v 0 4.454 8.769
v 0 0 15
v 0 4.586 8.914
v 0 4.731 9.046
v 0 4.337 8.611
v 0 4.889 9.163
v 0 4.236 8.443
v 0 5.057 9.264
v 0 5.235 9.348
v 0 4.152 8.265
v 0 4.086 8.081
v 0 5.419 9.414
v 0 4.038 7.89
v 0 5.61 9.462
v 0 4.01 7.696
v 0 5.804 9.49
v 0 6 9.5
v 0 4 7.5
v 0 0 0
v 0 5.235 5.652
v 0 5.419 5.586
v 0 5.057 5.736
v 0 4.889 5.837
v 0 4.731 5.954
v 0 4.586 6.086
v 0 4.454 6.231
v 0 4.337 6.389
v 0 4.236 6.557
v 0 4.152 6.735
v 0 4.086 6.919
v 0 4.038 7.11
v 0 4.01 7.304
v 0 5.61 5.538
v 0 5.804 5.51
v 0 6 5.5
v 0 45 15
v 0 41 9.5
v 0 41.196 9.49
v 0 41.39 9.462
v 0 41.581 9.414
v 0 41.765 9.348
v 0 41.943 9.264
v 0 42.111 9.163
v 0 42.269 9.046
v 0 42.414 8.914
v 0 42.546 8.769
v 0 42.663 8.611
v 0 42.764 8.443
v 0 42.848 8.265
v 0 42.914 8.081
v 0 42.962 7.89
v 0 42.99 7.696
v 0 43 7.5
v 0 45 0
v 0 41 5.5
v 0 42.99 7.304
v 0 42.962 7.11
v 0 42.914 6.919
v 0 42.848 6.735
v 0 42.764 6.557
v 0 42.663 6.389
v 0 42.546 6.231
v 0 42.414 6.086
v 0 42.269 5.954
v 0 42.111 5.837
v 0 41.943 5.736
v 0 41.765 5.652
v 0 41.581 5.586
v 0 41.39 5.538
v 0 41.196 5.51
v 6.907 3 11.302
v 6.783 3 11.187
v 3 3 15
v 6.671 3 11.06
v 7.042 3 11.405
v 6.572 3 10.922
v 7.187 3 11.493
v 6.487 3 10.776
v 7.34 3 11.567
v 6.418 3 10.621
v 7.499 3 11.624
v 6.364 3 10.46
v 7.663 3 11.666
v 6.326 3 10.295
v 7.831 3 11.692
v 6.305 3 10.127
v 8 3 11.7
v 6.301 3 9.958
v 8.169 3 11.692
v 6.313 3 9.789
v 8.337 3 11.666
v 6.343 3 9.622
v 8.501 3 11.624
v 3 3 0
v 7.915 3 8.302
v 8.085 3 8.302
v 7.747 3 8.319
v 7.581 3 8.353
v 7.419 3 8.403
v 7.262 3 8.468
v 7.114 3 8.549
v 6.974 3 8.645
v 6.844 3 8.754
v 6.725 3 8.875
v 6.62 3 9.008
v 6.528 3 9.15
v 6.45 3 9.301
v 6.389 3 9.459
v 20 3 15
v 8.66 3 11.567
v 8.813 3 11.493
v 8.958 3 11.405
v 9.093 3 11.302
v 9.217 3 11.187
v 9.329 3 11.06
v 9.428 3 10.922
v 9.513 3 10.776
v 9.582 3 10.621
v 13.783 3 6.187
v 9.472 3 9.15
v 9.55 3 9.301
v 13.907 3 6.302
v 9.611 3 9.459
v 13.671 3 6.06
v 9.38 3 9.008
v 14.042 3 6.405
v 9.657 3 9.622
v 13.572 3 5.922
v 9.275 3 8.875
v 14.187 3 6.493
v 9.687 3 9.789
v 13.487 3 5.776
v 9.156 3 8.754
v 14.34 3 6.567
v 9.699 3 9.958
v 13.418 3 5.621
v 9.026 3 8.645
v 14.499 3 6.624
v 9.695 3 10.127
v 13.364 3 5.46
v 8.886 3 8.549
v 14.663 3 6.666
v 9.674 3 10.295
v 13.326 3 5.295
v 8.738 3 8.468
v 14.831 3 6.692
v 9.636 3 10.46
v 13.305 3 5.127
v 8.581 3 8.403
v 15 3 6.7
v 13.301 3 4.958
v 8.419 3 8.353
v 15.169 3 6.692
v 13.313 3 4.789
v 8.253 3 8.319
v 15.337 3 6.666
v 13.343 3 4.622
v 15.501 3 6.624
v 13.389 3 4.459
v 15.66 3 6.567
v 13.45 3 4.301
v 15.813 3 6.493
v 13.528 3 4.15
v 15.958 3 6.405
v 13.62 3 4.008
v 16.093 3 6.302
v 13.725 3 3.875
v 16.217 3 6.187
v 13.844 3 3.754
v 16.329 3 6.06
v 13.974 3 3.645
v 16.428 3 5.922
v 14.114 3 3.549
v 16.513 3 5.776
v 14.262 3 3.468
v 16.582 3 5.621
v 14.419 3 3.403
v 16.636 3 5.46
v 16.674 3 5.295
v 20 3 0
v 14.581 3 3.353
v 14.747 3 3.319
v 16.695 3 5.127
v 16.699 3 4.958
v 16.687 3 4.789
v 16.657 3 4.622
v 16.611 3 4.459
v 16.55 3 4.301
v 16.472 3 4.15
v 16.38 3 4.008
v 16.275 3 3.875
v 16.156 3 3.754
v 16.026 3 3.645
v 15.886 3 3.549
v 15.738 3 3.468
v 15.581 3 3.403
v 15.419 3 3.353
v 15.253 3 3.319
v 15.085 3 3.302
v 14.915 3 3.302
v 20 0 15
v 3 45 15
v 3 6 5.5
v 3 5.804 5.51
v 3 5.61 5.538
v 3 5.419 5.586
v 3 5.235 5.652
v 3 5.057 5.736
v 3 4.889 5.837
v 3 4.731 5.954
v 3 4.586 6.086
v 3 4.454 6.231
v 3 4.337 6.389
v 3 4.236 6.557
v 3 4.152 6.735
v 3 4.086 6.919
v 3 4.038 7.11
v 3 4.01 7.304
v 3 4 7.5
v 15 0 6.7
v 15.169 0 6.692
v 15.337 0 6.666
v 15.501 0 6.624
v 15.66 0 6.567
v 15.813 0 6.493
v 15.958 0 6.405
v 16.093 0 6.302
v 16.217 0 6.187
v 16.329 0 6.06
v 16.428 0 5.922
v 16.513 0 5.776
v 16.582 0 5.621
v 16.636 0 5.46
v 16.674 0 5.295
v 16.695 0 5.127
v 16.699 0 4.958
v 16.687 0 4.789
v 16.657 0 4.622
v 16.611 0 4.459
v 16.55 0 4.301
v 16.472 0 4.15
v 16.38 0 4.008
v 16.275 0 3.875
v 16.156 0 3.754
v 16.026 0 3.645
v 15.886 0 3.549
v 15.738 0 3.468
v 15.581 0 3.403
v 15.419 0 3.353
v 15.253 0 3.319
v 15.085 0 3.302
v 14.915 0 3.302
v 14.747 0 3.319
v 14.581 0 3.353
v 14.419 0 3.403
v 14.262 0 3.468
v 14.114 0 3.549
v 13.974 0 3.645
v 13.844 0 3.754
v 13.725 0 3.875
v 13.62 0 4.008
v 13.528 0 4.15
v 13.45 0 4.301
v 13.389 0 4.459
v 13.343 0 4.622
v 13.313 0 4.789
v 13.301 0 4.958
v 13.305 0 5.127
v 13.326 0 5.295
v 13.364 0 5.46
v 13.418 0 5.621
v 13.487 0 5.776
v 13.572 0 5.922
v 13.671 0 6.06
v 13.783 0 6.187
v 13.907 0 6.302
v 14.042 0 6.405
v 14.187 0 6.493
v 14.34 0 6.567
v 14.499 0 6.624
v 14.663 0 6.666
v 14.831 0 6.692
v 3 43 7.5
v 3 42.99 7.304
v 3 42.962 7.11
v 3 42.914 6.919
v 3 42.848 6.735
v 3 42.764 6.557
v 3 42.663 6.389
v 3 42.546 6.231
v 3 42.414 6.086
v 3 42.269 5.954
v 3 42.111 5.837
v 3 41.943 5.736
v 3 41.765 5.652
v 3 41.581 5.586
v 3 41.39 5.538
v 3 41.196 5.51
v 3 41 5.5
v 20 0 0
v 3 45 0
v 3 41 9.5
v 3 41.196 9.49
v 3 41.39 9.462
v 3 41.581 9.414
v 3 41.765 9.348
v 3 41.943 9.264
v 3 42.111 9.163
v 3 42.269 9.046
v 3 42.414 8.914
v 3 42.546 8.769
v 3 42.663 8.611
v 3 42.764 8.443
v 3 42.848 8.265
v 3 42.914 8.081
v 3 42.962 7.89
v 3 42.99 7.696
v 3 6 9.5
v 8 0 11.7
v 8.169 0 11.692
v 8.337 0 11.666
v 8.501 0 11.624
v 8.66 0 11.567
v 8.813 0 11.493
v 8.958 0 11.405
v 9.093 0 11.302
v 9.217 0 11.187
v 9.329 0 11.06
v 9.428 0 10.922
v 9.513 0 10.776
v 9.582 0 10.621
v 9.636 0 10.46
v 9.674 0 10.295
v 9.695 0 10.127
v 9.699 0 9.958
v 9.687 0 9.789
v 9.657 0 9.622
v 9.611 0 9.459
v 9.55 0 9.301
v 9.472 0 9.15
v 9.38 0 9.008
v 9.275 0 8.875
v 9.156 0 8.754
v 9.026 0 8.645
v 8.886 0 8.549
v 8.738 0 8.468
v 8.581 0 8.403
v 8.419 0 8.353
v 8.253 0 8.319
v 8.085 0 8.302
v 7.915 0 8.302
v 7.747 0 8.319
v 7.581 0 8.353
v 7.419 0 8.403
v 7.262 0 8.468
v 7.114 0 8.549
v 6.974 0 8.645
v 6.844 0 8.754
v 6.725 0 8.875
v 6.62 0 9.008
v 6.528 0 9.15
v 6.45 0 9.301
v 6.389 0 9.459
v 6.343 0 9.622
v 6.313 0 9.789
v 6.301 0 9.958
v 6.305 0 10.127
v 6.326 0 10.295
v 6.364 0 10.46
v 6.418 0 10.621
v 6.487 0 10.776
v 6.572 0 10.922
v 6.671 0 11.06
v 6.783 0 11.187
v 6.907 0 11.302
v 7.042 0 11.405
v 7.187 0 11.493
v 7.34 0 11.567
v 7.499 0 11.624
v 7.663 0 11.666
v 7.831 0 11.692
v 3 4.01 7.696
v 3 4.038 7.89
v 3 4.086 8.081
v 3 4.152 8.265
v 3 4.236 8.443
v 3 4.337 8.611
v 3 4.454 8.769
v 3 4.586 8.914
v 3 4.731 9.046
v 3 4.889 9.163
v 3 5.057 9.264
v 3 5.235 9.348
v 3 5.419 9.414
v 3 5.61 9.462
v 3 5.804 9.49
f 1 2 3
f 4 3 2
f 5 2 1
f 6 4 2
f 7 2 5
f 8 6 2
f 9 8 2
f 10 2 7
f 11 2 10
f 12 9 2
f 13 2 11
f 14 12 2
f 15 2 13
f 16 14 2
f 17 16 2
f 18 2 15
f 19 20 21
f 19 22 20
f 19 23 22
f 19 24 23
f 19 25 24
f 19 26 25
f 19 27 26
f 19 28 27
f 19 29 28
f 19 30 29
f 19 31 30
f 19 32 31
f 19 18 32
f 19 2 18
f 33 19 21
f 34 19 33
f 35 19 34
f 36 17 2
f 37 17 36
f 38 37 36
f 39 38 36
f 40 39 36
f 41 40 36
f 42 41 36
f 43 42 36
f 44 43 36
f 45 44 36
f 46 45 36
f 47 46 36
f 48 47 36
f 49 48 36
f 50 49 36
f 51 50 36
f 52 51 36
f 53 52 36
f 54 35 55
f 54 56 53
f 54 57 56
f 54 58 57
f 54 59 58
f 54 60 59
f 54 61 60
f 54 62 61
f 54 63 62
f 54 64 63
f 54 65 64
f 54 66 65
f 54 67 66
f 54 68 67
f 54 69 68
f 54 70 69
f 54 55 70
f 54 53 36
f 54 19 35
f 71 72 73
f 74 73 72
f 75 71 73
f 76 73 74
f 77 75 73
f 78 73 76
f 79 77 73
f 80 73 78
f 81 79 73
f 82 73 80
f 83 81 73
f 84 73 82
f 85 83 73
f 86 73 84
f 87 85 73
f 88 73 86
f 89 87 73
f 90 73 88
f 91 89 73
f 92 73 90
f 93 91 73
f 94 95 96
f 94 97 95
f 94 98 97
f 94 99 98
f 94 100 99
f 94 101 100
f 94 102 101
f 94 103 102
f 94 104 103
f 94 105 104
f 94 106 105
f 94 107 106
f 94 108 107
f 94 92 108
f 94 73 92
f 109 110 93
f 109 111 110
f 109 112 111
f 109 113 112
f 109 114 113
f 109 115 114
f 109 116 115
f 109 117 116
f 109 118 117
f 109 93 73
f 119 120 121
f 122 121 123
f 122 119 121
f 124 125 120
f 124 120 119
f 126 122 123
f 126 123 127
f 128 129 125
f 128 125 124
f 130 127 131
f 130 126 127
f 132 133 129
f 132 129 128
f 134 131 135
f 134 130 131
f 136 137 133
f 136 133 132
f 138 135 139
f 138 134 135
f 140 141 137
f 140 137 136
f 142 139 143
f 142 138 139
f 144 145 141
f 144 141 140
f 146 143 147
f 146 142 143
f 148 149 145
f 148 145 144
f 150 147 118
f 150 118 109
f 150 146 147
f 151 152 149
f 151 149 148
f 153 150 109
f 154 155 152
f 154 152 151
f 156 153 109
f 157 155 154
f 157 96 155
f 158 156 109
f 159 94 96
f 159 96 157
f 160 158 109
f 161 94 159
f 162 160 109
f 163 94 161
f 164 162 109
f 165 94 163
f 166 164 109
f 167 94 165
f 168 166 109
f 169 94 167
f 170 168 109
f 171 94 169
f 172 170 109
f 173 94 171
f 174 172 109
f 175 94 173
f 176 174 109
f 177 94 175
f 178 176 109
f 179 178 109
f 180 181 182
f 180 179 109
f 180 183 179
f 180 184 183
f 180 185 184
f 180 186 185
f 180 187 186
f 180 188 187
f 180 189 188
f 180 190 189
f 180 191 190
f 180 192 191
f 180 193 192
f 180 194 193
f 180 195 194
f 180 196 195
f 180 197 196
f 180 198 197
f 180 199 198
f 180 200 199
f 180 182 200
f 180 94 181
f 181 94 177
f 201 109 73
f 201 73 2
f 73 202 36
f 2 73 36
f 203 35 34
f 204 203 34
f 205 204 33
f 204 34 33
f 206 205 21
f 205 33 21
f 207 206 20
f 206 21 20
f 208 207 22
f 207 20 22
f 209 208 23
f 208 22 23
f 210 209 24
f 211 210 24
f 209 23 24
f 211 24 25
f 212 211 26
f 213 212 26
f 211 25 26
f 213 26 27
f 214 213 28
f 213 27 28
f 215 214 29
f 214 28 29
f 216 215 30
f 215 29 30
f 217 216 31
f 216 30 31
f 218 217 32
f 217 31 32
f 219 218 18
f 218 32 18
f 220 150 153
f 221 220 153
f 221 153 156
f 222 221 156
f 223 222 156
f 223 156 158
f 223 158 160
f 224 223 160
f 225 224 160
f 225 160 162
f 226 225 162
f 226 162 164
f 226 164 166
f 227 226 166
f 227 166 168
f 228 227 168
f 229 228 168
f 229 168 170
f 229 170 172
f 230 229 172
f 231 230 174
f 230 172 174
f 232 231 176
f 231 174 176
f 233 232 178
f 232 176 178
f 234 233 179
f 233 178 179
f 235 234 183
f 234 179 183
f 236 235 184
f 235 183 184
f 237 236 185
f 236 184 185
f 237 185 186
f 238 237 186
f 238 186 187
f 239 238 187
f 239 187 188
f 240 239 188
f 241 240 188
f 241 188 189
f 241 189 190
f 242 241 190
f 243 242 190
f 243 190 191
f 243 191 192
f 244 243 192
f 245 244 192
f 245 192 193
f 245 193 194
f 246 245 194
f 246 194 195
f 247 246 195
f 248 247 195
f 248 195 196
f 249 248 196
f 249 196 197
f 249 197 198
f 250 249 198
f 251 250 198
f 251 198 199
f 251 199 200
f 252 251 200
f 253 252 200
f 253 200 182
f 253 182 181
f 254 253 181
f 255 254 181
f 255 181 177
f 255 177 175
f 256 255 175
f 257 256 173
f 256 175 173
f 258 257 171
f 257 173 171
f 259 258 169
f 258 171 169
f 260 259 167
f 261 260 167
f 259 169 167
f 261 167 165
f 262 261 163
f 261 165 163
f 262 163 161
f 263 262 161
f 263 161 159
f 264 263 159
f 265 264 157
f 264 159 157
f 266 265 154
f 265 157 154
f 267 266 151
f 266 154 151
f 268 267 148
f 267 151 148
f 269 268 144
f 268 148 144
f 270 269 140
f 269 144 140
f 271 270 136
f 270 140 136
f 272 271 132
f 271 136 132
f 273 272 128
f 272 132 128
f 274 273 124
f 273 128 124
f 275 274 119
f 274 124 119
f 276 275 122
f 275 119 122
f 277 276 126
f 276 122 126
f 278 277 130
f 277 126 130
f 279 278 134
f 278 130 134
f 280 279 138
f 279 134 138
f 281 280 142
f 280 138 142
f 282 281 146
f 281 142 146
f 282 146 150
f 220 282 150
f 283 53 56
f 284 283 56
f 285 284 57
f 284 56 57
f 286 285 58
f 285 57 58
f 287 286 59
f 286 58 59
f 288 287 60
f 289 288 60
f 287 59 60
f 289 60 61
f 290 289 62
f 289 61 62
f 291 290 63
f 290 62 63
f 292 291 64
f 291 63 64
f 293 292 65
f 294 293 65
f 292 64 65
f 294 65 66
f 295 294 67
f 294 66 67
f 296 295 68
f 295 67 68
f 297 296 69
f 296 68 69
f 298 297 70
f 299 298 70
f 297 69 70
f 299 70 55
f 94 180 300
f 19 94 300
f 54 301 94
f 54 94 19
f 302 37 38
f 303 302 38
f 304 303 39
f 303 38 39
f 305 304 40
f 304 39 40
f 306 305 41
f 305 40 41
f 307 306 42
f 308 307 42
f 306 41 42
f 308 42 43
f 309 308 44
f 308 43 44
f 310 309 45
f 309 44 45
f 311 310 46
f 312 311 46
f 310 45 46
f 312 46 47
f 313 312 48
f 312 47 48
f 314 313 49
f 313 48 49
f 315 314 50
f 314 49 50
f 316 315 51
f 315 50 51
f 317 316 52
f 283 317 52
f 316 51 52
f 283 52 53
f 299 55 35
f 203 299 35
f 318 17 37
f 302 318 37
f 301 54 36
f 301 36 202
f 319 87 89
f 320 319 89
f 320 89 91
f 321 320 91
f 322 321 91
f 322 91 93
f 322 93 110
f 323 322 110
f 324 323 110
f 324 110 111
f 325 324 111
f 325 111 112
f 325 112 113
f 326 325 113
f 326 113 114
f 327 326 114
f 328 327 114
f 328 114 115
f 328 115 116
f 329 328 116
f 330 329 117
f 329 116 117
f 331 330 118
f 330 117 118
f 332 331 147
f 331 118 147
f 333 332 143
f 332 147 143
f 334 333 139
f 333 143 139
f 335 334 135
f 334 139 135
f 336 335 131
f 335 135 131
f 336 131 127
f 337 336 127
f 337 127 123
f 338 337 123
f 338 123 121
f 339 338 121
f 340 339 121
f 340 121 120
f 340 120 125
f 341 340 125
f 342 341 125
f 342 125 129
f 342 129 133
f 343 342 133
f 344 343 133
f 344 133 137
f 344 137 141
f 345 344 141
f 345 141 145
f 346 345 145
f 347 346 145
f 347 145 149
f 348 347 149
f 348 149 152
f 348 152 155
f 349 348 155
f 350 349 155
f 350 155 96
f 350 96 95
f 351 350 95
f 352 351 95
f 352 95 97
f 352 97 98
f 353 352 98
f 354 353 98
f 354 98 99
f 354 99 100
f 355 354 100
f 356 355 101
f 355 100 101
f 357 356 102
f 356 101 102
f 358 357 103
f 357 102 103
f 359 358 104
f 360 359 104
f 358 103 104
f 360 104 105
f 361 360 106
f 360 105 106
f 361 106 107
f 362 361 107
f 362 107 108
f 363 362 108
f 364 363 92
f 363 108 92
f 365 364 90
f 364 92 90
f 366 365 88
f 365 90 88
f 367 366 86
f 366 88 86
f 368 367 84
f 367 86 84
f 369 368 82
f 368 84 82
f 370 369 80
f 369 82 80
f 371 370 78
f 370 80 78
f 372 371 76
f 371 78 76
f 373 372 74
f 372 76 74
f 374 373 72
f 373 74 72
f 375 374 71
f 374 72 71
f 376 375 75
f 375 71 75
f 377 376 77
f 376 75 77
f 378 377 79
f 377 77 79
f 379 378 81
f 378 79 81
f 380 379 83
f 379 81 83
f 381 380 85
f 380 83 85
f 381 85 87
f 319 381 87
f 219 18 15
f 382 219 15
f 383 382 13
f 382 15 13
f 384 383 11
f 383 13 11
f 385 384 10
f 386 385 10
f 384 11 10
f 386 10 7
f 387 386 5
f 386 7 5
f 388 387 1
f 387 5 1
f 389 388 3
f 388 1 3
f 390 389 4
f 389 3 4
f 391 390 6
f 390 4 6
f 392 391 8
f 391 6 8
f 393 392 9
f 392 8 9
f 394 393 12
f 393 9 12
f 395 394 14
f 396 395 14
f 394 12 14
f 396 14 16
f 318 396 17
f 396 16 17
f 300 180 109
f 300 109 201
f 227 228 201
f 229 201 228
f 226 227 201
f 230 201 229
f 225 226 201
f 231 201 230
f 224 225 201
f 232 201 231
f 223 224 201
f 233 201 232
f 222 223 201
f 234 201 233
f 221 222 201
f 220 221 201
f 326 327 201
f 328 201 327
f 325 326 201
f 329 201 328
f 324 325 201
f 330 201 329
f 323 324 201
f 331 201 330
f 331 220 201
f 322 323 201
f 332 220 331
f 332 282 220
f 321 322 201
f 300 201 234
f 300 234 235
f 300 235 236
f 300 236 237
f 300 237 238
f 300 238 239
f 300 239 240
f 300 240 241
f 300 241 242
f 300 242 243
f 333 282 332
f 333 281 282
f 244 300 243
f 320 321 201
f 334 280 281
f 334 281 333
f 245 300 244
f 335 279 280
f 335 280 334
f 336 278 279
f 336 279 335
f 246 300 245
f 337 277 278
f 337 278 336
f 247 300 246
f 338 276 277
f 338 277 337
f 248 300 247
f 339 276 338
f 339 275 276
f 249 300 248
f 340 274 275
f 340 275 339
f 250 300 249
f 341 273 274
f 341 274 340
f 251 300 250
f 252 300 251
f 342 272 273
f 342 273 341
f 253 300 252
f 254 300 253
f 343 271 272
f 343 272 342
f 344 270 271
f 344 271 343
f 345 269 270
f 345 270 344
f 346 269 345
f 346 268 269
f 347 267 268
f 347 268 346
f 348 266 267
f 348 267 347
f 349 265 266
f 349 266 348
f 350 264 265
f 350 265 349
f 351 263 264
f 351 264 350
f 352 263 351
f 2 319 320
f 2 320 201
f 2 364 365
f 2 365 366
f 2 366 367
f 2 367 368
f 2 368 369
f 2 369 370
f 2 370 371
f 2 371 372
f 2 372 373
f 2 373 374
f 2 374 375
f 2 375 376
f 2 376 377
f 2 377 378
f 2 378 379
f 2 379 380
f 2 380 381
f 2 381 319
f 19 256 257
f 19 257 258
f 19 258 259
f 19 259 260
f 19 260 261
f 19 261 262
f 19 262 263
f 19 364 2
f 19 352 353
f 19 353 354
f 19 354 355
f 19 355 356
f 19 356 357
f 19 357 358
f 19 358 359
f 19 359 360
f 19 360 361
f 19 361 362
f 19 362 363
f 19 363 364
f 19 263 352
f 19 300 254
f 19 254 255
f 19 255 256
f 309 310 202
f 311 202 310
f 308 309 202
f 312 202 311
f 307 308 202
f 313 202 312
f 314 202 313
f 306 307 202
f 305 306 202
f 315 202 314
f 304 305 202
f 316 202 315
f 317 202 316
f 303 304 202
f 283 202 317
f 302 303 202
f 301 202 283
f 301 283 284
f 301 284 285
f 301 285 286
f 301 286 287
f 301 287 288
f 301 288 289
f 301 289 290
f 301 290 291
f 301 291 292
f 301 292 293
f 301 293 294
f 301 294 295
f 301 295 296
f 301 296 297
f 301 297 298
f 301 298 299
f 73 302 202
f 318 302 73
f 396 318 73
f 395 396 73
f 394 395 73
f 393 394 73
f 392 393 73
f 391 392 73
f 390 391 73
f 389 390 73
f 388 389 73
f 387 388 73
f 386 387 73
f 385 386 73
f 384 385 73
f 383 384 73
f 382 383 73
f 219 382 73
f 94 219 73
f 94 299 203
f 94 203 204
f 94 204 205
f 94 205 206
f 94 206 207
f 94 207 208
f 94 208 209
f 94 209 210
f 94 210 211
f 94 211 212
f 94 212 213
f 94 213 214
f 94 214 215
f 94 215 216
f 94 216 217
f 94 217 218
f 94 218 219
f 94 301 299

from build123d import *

# Parameters (mm, degrees)
BOSS_EXTRUDE1_DEPTH = 15
CUT_EXTRUDE1_DEPTH  = 6
CUT_EXTRUDE2_REACH  = 50.877
SKETCH3_R           = 1.7


with BuildPart() as part:
    # Sketch1 → Boss-Extrude1 (new body)
    with BuildSketch(Plane.XY):
        Polygon((3, 45), (3, 3), (20, 3), (20, 0), (0, 0), (0, 45), align=None)
    extrude(amount=BOSS_EXTRUDE1_DEPTH)

    # Sketch2 → Cut-Extrude1 (cut)
    with BuildSketch(Plane.ZY):
        with BuildLine():
            ThreePointArc((5.5, 6), (6.085786438, 4.585786438), (7.5, 4))
            Line((7.5, 4), (7.5, 8))
            ThreePointArc((7.5, 8), (6.085786438, 7.414213562), (5.5, 6))
        make_face()
        with BuildLine():
            Line((7.5, 8), (7.5, 4))
            ThreePointArc((7.5, 4), (8.914213562, 4.585786438), (9.5, 6))
            ThreePointArc((9.5, 6), (8.914213562, 7.414213562), (7.5, 8))
        make_face()
        with BuildLine():
            ThreePointArc((5.5, 41), (6.085786438, 39.585786438), (7.5, 39))
            Line((7.5, 39), (7.5, 43))
            ThreePointArc((7.5, 43), (6.085786438, 42.414213562), (5.5, 41))
        make_face()
        with BuildLine():
            Line((7.5, 43), (7.5, 39))
            ThreePointArc((7.5, 39), (8.914213562, 39.585786438), (9.5, 41))
            ThreePointArc((9.5, 41), (8.914213562, 42.414213562), (7.5, 43))
        make_face()
        with BuildLine():
            ThreePointArc((5.5, 6), (6.085786438, 7.414213562), (7.5, 8))
            Line((7.5, 8), (7.5, 39))
            ThreePointArc((7.5, 39), (6.085786438, 39.585786438), (5.5, 41))
            Line((5.5, 41), (5.5, 6))
        make_face()
        with BuildLine():
            Line((7.5, 39), (7.5, 8))
            ThreePointArc((7.5, 8), (8.914213562, 7.414213562), (9.5, 6))
            Line((9.5, 6), (9.5, 41))
            ThreePointArc((9.5, 41), (8.914213562, 39.585786438), (7.5, 39))
        make_face()
    extrude(amount=-CUT_EXTRUDE1_DEPTH, mode=Mode.SUBTRACT)

    # Sketch3 → Cut-Extrude2 (cut, up to next)
    with BuildSketch(Plane(origin=(0, 3, 0), x_dir=(1, 0, 0), z_dir=(0, 1, 0)), mode=Mode.PRIVATE) as cut_extrude2_sk1:
        with Locations(Location((8, -10, 0), (0, 0, 270))):
            Circle(SKETCH3_R)
    cut_extrude2_tool1 = extrude(cut_extrude2_sk1.sketch, amount=-CUT_EXTRUDE2_REACH, mode=Mode.PRIVATE) & part.part
    # Sketch3 → Cut-Extrude2 (cut, up to next)
    with BuildSketch(Plane(origin=(0, 3, 0), x_dir=(1, 0, 0), z_dir=(0, 1, 0)), mode=Mode.PRIVATE) as cut_extrude2_sk2:
        with Locations(Location((15, -5, 0), (0, 0, 270))):
            Circle(SKETCH3_R)
    cut_extrude2_tool2 = extrude(cut_extrude2_sk2.sketch, amount=-CUT_EXTRUDE2_REACH, mode=Mode.PRIVATE) & part.part
    add(cut_extrude2_tool1.solids().sort_by_distance((8, 3, 10))[0], mode=Mode.SUBTRACT)
    add(cut_extrude2_tool2.solids().sort_by_distance((15, 3, 5))[0], mode=Mode.SUBTRACT)


solid = part.part
